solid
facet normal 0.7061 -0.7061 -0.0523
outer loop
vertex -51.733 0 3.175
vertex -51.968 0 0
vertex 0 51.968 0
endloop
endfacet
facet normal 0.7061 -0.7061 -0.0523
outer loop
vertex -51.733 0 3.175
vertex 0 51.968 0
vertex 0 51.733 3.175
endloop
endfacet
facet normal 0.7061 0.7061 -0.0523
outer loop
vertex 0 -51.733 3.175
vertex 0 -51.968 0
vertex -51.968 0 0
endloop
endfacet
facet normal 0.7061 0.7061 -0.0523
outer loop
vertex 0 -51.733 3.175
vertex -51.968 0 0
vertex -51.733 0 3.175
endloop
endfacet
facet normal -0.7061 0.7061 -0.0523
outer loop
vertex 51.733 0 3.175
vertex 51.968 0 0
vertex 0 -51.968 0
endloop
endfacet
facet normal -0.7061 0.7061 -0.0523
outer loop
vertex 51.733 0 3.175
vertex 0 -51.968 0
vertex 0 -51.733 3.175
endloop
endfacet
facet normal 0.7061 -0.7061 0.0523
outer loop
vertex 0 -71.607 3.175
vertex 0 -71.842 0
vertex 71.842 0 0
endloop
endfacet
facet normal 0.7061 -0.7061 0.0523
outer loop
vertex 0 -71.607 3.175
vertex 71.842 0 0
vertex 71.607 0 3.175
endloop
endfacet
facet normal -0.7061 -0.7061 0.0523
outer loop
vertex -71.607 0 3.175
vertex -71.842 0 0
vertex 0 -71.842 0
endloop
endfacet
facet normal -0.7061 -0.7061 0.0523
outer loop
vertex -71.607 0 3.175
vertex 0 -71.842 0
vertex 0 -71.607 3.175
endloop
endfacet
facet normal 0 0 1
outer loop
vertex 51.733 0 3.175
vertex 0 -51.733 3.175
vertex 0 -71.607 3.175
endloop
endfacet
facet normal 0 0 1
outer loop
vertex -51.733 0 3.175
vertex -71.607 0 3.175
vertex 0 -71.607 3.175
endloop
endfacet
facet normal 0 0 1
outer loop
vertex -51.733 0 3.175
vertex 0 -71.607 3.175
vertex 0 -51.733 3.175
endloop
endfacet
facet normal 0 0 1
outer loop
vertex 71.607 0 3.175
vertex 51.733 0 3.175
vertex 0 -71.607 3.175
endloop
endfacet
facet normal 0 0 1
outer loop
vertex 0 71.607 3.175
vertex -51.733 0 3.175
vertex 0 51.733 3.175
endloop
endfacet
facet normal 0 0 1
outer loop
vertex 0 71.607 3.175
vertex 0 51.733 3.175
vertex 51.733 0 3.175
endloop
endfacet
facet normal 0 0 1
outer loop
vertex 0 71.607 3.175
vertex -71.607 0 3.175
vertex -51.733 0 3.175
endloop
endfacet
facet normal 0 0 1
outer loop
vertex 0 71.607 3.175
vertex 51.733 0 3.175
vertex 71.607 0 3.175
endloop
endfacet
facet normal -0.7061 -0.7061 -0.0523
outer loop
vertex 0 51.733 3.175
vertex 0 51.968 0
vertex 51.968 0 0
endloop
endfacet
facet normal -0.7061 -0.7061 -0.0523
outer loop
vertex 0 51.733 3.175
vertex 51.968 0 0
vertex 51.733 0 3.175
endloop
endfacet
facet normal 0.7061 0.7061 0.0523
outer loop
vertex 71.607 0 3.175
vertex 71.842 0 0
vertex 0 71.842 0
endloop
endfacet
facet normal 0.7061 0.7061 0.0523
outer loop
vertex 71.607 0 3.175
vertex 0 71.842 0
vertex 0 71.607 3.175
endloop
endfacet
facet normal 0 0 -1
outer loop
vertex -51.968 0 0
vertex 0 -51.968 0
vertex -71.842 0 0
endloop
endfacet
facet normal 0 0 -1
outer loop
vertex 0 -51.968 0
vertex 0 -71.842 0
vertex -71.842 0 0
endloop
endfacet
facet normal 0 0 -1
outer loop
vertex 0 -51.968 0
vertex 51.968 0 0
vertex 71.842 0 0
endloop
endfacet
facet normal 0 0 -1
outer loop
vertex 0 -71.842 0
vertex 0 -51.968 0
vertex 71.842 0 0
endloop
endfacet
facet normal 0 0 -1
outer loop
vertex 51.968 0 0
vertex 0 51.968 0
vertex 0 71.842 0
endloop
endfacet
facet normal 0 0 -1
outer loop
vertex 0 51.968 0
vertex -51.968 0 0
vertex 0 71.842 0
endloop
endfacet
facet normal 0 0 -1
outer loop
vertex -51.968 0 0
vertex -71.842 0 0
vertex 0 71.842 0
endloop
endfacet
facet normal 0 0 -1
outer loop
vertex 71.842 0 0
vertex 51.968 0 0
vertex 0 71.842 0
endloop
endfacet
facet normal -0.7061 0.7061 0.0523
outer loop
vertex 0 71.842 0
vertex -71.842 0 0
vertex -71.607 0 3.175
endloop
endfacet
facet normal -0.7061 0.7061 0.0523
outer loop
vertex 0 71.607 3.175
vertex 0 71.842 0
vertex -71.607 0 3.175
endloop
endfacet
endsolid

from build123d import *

# Parameters (mm, degrees)
F0_W     = 101.6
F0_H     = 101.6
F1_DEPTH = 3.175
F1_TAPER = 3
F2_T     = -14.0335
F4_ANGLE = 45


# Not quite as in the source:
# - a feature of the source that left no trace in its solid (it failed there, or was rolled back) is left out


with BuildPart() as f1:
    # F0 (on Top) → F1 (new body)
    with BuildSketch(Plane.XY):
        Rectangle(F0_W, F0_H)
    extrude(amount=F1_DEPTH, taper=F1_TAPER)

    # F2
    f2_openings = [f1.faces().sort_by_distance(p)[0] for p in [
        (0, 0, 3.175),
        (0, 0, 0),
    ]]
    offset(amount=F2_T, openings=f2_openings)


with BuildPart() as f1_1:
    # F4: moved
    add(f1.part.rotate(Axis((0, 0, 69.4056898355), (0, 0, 1)), F4_ANGLE))


solid = f1_1.part
